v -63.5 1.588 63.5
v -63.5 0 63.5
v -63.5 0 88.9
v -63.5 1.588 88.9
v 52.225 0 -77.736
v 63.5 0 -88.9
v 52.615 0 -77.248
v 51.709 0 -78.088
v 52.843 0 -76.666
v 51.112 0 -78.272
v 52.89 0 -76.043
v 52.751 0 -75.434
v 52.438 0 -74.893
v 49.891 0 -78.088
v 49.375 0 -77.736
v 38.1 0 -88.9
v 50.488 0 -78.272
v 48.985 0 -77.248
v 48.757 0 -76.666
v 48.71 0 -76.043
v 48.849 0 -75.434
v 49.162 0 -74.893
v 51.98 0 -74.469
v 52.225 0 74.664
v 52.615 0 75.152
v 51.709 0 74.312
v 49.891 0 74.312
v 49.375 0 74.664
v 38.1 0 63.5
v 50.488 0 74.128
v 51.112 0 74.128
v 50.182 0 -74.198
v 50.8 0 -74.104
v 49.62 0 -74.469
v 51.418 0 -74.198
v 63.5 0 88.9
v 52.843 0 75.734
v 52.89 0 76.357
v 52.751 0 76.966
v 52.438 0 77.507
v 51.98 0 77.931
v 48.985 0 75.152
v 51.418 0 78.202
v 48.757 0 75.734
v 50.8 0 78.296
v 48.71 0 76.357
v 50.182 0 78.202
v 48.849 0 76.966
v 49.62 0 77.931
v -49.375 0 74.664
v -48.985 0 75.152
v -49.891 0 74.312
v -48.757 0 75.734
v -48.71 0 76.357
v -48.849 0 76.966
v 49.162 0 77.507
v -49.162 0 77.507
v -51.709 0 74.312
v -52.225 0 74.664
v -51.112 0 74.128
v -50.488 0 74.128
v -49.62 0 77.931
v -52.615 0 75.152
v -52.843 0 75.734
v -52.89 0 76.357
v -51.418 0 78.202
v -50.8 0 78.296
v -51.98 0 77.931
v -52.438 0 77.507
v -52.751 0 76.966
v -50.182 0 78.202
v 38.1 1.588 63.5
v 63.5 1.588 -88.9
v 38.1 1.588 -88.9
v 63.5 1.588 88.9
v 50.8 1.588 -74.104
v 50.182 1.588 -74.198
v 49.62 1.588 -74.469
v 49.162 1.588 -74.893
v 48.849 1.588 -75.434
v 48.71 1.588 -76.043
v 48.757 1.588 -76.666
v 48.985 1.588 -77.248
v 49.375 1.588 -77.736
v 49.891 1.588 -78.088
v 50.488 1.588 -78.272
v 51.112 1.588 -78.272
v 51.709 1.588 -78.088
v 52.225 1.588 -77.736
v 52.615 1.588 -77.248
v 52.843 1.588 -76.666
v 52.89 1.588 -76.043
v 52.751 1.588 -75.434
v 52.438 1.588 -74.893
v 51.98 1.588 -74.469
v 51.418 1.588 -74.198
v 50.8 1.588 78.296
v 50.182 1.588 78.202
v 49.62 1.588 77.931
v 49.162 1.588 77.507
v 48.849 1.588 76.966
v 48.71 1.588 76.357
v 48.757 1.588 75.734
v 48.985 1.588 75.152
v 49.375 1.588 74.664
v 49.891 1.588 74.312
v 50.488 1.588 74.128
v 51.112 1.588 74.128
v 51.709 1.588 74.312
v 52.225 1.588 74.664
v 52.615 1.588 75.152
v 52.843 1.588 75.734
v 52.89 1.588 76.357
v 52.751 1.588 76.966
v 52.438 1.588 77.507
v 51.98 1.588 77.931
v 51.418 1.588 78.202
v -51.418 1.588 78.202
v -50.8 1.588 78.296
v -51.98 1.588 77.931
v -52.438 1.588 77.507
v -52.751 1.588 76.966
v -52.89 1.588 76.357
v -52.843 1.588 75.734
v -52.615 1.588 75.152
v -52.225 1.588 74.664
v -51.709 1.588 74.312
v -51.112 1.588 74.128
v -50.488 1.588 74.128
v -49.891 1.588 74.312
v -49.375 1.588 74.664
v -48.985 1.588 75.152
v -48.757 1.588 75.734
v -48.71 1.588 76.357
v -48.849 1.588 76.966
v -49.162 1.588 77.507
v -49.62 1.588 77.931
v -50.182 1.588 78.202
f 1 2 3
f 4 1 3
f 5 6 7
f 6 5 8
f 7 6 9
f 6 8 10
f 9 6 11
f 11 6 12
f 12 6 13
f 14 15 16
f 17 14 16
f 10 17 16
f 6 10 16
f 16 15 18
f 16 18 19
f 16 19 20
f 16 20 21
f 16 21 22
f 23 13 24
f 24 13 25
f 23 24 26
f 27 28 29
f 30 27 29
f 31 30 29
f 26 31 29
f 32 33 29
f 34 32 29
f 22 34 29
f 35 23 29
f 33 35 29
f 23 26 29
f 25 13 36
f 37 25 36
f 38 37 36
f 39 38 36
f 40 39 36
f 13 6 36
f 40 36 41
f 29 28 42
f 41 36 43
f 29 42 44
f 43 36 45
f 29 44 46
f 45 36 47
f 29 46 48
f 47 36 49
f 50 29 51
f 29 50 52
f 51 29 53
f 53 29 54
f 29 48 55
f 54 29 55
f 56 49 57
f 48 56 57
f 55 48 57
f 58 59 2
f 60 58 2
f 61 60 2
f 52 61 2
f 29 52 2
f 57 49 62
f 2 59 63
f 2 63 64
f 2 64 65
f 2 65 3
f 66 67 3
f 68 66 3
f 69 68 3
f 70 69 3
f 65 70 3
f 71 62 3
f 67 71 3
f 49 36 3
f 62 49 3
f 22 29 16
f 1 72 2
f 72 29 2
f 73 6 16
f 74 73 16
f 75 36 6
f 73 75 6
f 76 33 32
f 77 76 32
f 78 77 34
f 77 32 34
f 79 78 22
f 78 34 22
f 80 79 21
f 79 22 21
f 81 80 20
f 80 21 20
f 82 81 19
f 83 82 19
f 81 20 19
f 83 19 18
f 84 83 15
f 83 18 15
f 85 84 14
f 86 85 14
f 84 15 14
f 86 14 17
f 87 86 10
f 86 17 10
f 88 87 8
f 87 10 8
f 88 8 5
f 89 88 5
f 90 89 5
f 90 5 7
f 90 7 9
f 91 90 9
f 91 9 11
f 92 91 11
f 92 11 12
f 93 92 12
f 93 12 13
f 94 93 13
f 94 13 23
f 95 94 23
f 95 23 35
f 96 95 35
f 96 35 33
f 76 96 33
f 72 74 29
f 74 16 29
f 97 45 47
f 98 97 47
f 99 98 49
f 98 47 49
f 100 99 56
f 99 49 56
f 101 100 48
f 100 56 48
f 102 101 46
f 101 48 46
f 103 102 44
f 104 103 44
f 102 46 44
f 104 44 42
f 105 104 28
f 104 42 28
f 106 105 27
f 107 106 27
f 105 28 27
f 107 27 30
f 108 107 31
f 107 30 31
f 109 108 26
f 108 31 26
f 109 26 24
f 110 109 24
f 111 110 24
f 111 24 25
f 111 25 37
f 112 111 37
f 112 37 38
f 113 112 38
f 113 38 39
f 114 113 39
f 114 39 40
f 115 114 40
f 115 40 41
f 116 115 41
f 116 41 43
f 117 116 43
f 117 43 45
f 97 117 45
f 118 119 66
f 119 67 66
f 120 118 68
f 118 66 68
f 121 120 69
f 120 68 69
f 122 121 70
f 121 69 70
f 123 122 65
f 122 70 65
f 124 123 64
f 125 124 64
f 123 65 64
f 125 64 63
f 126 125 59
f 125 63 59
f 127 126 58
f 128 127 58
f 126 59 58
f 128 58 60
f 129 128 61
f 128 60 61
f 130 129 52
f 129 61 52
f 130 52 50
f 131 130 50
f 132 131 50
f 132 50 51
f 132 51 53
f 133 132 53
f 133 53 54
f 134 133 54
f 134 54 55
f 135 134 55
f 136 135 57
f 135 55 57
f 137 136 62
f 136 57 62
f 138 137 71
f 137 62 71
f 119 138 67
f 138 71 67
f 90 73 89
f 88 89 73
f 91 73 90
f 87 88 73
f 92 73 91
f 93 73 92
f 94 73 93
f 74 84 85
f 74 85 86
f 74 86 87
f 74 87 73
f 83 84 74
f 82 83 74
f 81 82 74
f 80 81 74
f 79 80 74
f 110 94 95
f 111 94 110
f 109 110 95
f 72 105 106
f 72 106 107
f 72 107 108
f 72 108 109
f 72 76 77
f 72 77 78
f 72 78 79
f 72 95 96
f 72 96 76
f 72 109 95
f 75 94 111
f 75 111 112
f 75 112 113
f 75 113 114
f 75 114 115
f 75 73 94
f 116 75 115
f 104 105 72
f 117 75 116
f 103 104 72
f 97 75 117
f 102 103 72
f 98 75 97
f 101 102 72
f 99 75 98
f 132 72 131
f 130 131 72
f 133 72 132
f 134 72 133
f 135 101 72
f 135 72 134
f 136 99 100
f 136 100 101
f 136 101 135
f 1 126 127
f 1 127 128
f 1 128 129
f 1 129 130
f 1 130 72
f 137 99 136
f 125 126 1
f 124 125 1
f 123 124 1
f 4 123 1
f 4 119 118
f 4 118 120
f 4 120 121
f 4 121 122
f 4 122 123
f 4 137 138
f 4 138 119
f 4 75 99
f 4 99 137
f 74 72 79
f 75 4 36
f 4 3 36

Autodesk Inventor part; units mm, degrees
ref_plane "YZ Plane" through (0, 0, 0) normal (1, 0, 0) x (0, 1, 0)
ref_plane "XZ Plane" through (0, 0, 0) normal (0, 1, 0) x (-1, 0, 0)
ref_plane "XY Plane" through (0, 0, 0) normal (0, 0, 1) x (1, 0, 0)
sketch "Sketch1" plane through (0, 0, 0) normal (0, 1, 0) x (-1, 0, 0)
  line L0 (-63.5, -88.9) -> (63.5, -88.9)
  line L1 (63.5, -88.9) -> (63.5, 88.9)
  line L2 (63.5, 88.9) -> (-63.5, 88.9)
  line L3 (-63.5, 88.9) -> (-63.5, -88.9)
  line L4 (-63.5, -88.9) -> (63.5, 88.9) construction
  line L5 (63.5, -88.9) -> (-63.5, 88.9) construction
  line L6 (63.5, -88.9) -> (-38.1, -88.9)
  line L7 (-38.1, -88.9) -> (-38.1, 63.5)
  line L8 (-38.1, 63.5) -> (63.5, 63.5)
  line L9 (63.5, 63.5) -> (63.5, -88.9)
  point P0 (0, 0)
  dimension "d0" = 127
  dimension "d1" = 177.8
  dimension "d2" = 101.6
  dimension "d3" = 152.4
extrude "Extrusion1" add sketch "Sketch1" along normal blind 1.5875 contours L3 L2 L1 L8 L7 L0
sketch "Sketch2" plane through (0, 1.5875, 0) normal (0, 1, 0) x (1, 0, 0)
  line L0 (-63.5, -63.5) -> (-63.5, -88.9) projected
  line L1 (-63.5, -88.9) -> (63.5, -88.9) projected
  line L2 (63.5, -88.9) -> (63.5, 88.9) projected
  line L3 (63.5, 88.9) -> (38.1, 88.9) projected
  line L4 (-63.5, -76.2) -> (63.5, -76.2) construction
  line L5 (50.8, 88.9) -> (50.8, -88.9) construction
  point P0 (0, 0)
  point P1 (-50.8, -76.2)
  point P2 (50.8, 76.2)
  point P3 (50.8, -76.2)
  dimension "d6" = 12.7
  dimension "d7" = 12.7
hole "Hole1" at (-50.8, 1.5875, 76.2) at (50.8, 1.5875, -76.2) at (50.8, 1.5875, 76.2) direction (0, -1, 0) diameter 4.191 end through all
properties part number "topLayer"
